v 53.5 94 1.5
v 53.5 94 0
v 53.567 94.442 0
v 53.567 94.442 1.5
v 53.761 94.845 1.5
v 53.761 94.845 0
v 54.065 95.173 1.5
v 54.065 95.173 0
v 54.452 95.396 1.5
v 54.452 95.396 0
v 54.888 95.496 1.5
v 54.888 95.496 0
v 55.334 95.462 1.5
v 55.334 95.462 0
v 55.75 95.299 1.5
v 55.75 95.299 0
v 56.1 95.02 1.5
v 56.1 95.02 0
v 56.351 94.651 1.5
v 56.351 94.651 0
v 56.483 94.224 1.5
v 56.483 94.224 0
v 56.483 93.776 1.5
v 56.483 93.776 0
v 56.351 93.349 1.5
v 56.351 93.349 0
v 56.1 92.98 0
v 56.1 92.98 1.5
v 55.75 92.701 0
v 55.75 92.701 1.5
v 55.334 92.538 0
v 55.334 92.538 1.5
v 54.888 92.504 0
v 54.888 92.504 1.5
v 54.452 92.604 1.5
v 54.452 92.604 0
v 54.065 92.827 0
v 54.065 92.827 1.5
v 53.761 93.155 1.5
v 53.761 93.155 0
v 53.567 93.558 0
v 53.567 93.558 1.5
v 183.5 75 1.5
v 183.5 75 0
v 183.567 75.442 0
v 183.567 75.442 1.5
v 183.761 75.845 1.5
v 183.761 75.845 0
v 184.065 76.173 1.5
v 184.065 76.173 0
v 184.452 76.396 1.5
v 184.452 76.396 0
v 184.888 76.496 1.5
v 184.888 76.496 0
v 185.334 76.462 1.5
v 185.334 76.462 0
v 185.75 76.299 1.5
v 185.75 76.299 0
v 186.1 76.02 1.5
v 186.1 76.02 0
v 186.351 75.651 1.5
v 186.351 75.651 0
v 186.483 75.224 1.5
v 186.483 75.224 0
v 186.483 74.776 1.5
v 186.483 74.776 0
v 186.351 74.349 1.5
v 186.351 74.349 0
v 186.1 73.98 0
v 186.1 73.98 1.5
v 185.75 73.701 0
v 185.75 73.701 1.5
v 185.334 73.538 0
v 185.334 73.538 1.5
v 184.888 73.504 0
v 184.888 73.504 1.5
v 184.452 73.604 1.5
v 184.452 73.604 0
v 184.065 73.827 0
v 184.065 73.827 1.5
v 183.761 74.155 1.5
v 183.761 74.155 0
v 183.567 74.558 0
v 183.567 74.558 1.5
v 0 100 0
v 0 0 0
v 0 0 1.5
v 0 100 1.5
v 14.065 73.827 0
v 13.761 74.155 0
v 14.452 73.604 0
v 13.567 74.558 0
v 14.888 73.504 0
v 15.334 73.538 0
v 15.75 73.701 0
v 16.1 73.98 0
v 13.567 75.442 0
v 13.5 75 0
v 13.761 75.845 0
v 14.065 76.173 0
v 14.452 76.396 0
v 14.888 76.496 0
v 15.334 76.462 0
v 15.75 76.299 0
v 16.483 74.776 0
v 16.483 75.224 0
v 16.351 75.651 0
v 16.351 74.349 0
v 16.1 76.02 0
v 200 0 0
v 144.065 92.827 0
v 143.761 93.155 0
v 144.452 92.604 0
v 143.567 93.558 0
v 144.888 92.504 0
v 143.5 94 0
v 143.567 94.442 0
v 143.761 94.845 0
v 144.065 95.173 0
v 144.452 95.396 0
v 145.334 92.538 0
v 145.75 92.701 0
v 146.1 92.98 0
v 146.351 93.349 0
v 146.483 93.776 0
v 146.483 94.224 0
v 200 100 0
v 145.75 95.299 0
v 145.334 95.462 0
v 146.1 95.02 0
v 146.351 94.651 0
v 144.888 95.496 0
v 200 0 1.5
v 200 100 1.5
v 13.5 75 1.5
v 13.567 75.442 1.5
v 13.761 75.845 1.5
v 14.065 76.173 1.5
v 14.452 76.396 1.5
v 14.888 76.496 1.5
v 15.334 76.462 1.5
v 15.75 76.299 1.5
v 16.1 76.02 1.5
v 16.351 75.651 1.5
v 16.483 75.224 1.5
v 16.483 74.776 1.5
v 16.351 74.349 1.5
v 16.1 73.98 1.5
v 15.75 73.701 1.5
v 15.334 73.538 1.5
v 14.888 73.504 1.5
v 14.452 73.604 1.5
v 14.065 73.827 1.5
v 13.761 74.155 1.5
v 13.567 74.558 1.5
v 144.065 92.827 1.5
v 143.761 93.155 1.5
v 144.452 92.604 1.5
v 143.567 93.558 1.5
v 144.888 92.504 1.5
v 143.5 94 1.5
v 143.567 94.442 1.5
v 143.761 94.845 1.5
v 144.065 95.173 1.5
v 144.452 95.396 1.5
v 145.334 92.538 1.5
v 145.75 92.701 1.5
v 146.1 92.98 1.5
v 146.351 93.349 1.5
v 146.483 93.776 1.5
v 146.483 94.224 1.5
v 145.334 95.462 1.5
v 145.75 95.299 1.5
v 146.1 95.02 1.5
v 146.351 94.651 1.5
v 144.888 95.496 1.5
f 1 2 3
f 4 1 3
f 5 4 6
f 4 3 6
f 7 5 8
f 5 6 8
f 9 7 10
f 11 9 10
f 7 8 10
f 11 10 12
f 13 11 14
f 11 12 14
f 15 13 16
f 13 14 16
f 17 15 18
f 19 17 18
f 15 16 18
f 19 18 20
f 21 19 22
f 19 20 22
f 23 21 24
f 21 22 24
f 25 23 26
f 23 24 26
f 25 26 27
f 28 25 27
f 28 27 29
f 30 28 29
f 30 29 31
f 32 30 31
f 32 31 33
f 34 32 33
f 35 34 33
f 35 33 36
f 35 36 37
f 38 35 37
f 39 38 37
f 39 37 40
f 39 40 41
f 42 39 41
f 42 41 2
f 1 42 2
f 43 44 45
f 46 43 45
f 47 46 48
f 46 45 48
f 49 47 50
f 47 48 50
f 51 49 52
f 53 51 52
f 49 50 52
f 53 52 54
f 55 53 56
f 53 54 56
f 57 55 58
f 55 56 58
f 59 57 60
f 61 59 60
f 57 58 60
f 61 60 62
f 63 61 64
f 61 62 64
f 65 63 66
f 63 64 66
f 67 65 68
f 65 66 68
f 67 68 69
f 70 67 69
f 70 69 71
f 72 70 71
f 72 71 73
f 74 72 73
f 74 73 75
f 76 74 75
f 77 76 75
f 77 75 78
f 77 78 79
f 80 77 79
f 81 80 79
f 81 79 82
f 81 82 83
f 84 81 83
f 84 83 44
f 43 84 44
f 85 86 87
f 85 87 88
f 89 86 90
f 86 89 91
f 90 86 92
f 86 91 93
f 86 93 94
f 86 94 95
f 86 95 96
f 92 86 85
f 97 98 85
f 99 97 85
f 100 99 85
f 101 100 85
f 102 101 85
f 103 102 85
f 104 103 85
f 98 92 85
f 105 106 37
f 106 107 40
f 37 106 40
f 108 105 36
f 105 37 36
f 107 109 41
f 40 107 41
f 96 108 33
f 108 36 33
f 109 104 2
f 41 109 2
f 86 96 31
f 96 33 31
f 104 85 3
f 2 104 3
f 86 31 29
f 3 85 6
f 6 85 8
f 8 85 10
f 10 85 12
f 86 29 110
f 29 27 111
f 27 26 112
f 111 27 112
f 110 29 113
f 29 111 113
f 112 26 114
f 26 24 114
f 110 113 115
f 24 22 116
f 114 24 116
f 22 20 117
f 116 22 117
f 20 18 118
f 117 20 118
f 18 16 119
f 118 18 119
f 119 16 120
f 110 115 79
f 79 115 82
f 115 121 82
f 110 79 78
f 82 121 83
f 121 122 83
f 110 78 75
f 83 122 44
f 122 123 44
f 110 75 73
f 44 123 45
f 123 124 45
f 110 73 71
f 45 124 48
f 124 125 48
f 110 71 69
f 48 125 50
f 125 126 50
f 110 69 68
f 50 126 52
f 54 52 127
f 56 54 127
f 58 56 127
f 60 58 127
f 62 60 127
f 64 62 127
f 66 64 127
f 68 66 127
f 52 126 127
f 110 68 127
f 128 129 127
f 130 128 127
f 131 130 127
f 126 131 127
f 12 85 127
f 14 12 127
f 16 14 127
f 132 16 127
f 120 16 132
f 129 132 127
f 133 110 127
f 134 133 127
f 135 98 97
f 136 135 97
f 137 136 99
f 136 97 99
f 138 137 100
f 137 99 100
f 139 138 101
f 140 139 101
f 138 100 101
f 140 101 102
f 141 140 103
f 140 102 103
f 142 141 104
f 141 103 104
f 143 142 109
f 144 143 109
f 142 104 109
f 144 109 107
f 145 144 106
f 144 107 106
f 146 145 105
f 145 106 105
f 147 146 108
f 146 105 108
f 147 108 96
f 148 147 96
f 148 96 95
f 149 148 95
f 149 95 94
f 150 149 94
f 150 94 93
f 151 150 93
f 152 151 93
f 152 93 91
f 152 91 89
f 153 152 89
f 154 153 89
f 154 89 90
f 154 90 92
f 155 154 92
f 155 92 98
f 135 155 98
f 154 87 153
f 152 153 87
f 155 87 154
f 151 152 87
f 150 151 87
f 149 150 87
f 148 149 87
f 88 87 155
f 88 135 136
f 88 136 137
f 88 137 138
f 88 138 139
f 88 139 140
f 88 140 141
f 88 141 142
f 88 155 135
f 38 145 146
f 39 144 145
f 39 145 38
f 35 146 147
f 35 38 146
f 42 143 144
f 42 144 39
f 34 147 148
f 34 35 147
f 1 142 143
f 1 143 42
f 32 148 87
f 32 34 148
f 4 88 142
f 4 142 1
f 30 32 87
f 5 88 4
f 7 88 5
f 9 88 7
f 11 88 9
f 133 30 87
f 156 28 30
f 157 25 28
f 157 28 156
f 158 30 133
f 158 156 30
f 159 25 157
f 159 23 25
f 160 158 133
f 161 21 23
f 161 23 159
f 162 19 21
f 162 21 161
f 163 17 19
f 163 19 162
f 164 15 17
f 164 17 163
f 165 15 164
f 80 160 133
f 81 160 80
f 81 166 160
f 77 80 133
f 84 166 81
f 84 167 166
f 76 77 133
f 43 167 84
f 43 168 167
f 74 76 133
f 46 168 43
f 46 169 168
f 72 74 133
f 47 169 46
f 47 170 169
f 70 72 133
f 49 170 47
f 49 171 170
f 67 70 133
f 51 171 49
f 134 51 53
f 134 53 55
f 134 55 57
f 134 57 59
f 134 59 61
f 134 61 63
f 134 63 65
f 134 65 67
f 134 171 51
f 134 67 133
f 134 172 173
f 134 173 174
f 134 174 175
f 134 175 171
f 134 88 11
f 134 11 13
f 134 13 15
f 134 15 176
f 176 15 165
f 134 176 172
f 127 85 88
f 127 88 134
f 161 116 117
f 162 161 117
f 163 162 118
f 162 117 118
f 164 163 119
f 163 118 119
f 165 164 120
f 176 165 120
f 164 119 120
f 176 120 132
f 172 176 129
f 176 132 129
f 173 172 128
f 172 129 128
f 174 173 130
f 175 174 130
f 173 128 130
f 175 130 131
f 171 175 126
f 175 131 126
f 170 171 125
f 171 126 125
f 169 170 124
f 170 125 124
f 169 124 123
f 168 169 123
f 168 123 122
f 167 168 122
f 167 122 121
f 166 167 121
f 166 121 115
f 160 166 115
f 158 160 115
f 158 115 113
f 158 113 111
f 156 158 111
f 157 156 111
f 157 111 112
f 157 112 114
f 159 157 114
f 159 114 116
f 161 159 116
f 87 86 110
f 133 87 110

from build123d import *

# Parameters (mm, degrees)
SKETCH1_W             = 200
SKETCH1_H             = 100
BOSS_EXTRUDE1_DEPTH   = 1.5
F_3_0MM_DOWEL_HOLE2_D = 3
F_3_0MM_DOWEL_HOLE3_D = 3


with BuildPart() as part:
    # Sketch1 → Boss-Extrude1 (new body)
    with BuildSketch(Plane.XY):
        with Locations((100, 50)):
            Rectangle(SKETCH1_W, SKETCH1_H)
    extrude(amount=BOSS_EXTRUDE1_DEPTH)

    # Ø3.0mm Dowel Hole2 (through all)
    with Locations(Plane.XY.offset(1.5)):
        with Locations((15, 75), (185, 75)):
            Hole(F_3_0MM_DOWEL_HOLE2_D / 2)

    # Ø3.0mm Dowel Hole3 (through all)
    with Locations(Plane.XY.offset(1.5)):
        with Locations((55, 94), (145, 94)):
            Hole(F_3_0MM_DOWEL_HOLE3_D / 2)


solid = part.part
